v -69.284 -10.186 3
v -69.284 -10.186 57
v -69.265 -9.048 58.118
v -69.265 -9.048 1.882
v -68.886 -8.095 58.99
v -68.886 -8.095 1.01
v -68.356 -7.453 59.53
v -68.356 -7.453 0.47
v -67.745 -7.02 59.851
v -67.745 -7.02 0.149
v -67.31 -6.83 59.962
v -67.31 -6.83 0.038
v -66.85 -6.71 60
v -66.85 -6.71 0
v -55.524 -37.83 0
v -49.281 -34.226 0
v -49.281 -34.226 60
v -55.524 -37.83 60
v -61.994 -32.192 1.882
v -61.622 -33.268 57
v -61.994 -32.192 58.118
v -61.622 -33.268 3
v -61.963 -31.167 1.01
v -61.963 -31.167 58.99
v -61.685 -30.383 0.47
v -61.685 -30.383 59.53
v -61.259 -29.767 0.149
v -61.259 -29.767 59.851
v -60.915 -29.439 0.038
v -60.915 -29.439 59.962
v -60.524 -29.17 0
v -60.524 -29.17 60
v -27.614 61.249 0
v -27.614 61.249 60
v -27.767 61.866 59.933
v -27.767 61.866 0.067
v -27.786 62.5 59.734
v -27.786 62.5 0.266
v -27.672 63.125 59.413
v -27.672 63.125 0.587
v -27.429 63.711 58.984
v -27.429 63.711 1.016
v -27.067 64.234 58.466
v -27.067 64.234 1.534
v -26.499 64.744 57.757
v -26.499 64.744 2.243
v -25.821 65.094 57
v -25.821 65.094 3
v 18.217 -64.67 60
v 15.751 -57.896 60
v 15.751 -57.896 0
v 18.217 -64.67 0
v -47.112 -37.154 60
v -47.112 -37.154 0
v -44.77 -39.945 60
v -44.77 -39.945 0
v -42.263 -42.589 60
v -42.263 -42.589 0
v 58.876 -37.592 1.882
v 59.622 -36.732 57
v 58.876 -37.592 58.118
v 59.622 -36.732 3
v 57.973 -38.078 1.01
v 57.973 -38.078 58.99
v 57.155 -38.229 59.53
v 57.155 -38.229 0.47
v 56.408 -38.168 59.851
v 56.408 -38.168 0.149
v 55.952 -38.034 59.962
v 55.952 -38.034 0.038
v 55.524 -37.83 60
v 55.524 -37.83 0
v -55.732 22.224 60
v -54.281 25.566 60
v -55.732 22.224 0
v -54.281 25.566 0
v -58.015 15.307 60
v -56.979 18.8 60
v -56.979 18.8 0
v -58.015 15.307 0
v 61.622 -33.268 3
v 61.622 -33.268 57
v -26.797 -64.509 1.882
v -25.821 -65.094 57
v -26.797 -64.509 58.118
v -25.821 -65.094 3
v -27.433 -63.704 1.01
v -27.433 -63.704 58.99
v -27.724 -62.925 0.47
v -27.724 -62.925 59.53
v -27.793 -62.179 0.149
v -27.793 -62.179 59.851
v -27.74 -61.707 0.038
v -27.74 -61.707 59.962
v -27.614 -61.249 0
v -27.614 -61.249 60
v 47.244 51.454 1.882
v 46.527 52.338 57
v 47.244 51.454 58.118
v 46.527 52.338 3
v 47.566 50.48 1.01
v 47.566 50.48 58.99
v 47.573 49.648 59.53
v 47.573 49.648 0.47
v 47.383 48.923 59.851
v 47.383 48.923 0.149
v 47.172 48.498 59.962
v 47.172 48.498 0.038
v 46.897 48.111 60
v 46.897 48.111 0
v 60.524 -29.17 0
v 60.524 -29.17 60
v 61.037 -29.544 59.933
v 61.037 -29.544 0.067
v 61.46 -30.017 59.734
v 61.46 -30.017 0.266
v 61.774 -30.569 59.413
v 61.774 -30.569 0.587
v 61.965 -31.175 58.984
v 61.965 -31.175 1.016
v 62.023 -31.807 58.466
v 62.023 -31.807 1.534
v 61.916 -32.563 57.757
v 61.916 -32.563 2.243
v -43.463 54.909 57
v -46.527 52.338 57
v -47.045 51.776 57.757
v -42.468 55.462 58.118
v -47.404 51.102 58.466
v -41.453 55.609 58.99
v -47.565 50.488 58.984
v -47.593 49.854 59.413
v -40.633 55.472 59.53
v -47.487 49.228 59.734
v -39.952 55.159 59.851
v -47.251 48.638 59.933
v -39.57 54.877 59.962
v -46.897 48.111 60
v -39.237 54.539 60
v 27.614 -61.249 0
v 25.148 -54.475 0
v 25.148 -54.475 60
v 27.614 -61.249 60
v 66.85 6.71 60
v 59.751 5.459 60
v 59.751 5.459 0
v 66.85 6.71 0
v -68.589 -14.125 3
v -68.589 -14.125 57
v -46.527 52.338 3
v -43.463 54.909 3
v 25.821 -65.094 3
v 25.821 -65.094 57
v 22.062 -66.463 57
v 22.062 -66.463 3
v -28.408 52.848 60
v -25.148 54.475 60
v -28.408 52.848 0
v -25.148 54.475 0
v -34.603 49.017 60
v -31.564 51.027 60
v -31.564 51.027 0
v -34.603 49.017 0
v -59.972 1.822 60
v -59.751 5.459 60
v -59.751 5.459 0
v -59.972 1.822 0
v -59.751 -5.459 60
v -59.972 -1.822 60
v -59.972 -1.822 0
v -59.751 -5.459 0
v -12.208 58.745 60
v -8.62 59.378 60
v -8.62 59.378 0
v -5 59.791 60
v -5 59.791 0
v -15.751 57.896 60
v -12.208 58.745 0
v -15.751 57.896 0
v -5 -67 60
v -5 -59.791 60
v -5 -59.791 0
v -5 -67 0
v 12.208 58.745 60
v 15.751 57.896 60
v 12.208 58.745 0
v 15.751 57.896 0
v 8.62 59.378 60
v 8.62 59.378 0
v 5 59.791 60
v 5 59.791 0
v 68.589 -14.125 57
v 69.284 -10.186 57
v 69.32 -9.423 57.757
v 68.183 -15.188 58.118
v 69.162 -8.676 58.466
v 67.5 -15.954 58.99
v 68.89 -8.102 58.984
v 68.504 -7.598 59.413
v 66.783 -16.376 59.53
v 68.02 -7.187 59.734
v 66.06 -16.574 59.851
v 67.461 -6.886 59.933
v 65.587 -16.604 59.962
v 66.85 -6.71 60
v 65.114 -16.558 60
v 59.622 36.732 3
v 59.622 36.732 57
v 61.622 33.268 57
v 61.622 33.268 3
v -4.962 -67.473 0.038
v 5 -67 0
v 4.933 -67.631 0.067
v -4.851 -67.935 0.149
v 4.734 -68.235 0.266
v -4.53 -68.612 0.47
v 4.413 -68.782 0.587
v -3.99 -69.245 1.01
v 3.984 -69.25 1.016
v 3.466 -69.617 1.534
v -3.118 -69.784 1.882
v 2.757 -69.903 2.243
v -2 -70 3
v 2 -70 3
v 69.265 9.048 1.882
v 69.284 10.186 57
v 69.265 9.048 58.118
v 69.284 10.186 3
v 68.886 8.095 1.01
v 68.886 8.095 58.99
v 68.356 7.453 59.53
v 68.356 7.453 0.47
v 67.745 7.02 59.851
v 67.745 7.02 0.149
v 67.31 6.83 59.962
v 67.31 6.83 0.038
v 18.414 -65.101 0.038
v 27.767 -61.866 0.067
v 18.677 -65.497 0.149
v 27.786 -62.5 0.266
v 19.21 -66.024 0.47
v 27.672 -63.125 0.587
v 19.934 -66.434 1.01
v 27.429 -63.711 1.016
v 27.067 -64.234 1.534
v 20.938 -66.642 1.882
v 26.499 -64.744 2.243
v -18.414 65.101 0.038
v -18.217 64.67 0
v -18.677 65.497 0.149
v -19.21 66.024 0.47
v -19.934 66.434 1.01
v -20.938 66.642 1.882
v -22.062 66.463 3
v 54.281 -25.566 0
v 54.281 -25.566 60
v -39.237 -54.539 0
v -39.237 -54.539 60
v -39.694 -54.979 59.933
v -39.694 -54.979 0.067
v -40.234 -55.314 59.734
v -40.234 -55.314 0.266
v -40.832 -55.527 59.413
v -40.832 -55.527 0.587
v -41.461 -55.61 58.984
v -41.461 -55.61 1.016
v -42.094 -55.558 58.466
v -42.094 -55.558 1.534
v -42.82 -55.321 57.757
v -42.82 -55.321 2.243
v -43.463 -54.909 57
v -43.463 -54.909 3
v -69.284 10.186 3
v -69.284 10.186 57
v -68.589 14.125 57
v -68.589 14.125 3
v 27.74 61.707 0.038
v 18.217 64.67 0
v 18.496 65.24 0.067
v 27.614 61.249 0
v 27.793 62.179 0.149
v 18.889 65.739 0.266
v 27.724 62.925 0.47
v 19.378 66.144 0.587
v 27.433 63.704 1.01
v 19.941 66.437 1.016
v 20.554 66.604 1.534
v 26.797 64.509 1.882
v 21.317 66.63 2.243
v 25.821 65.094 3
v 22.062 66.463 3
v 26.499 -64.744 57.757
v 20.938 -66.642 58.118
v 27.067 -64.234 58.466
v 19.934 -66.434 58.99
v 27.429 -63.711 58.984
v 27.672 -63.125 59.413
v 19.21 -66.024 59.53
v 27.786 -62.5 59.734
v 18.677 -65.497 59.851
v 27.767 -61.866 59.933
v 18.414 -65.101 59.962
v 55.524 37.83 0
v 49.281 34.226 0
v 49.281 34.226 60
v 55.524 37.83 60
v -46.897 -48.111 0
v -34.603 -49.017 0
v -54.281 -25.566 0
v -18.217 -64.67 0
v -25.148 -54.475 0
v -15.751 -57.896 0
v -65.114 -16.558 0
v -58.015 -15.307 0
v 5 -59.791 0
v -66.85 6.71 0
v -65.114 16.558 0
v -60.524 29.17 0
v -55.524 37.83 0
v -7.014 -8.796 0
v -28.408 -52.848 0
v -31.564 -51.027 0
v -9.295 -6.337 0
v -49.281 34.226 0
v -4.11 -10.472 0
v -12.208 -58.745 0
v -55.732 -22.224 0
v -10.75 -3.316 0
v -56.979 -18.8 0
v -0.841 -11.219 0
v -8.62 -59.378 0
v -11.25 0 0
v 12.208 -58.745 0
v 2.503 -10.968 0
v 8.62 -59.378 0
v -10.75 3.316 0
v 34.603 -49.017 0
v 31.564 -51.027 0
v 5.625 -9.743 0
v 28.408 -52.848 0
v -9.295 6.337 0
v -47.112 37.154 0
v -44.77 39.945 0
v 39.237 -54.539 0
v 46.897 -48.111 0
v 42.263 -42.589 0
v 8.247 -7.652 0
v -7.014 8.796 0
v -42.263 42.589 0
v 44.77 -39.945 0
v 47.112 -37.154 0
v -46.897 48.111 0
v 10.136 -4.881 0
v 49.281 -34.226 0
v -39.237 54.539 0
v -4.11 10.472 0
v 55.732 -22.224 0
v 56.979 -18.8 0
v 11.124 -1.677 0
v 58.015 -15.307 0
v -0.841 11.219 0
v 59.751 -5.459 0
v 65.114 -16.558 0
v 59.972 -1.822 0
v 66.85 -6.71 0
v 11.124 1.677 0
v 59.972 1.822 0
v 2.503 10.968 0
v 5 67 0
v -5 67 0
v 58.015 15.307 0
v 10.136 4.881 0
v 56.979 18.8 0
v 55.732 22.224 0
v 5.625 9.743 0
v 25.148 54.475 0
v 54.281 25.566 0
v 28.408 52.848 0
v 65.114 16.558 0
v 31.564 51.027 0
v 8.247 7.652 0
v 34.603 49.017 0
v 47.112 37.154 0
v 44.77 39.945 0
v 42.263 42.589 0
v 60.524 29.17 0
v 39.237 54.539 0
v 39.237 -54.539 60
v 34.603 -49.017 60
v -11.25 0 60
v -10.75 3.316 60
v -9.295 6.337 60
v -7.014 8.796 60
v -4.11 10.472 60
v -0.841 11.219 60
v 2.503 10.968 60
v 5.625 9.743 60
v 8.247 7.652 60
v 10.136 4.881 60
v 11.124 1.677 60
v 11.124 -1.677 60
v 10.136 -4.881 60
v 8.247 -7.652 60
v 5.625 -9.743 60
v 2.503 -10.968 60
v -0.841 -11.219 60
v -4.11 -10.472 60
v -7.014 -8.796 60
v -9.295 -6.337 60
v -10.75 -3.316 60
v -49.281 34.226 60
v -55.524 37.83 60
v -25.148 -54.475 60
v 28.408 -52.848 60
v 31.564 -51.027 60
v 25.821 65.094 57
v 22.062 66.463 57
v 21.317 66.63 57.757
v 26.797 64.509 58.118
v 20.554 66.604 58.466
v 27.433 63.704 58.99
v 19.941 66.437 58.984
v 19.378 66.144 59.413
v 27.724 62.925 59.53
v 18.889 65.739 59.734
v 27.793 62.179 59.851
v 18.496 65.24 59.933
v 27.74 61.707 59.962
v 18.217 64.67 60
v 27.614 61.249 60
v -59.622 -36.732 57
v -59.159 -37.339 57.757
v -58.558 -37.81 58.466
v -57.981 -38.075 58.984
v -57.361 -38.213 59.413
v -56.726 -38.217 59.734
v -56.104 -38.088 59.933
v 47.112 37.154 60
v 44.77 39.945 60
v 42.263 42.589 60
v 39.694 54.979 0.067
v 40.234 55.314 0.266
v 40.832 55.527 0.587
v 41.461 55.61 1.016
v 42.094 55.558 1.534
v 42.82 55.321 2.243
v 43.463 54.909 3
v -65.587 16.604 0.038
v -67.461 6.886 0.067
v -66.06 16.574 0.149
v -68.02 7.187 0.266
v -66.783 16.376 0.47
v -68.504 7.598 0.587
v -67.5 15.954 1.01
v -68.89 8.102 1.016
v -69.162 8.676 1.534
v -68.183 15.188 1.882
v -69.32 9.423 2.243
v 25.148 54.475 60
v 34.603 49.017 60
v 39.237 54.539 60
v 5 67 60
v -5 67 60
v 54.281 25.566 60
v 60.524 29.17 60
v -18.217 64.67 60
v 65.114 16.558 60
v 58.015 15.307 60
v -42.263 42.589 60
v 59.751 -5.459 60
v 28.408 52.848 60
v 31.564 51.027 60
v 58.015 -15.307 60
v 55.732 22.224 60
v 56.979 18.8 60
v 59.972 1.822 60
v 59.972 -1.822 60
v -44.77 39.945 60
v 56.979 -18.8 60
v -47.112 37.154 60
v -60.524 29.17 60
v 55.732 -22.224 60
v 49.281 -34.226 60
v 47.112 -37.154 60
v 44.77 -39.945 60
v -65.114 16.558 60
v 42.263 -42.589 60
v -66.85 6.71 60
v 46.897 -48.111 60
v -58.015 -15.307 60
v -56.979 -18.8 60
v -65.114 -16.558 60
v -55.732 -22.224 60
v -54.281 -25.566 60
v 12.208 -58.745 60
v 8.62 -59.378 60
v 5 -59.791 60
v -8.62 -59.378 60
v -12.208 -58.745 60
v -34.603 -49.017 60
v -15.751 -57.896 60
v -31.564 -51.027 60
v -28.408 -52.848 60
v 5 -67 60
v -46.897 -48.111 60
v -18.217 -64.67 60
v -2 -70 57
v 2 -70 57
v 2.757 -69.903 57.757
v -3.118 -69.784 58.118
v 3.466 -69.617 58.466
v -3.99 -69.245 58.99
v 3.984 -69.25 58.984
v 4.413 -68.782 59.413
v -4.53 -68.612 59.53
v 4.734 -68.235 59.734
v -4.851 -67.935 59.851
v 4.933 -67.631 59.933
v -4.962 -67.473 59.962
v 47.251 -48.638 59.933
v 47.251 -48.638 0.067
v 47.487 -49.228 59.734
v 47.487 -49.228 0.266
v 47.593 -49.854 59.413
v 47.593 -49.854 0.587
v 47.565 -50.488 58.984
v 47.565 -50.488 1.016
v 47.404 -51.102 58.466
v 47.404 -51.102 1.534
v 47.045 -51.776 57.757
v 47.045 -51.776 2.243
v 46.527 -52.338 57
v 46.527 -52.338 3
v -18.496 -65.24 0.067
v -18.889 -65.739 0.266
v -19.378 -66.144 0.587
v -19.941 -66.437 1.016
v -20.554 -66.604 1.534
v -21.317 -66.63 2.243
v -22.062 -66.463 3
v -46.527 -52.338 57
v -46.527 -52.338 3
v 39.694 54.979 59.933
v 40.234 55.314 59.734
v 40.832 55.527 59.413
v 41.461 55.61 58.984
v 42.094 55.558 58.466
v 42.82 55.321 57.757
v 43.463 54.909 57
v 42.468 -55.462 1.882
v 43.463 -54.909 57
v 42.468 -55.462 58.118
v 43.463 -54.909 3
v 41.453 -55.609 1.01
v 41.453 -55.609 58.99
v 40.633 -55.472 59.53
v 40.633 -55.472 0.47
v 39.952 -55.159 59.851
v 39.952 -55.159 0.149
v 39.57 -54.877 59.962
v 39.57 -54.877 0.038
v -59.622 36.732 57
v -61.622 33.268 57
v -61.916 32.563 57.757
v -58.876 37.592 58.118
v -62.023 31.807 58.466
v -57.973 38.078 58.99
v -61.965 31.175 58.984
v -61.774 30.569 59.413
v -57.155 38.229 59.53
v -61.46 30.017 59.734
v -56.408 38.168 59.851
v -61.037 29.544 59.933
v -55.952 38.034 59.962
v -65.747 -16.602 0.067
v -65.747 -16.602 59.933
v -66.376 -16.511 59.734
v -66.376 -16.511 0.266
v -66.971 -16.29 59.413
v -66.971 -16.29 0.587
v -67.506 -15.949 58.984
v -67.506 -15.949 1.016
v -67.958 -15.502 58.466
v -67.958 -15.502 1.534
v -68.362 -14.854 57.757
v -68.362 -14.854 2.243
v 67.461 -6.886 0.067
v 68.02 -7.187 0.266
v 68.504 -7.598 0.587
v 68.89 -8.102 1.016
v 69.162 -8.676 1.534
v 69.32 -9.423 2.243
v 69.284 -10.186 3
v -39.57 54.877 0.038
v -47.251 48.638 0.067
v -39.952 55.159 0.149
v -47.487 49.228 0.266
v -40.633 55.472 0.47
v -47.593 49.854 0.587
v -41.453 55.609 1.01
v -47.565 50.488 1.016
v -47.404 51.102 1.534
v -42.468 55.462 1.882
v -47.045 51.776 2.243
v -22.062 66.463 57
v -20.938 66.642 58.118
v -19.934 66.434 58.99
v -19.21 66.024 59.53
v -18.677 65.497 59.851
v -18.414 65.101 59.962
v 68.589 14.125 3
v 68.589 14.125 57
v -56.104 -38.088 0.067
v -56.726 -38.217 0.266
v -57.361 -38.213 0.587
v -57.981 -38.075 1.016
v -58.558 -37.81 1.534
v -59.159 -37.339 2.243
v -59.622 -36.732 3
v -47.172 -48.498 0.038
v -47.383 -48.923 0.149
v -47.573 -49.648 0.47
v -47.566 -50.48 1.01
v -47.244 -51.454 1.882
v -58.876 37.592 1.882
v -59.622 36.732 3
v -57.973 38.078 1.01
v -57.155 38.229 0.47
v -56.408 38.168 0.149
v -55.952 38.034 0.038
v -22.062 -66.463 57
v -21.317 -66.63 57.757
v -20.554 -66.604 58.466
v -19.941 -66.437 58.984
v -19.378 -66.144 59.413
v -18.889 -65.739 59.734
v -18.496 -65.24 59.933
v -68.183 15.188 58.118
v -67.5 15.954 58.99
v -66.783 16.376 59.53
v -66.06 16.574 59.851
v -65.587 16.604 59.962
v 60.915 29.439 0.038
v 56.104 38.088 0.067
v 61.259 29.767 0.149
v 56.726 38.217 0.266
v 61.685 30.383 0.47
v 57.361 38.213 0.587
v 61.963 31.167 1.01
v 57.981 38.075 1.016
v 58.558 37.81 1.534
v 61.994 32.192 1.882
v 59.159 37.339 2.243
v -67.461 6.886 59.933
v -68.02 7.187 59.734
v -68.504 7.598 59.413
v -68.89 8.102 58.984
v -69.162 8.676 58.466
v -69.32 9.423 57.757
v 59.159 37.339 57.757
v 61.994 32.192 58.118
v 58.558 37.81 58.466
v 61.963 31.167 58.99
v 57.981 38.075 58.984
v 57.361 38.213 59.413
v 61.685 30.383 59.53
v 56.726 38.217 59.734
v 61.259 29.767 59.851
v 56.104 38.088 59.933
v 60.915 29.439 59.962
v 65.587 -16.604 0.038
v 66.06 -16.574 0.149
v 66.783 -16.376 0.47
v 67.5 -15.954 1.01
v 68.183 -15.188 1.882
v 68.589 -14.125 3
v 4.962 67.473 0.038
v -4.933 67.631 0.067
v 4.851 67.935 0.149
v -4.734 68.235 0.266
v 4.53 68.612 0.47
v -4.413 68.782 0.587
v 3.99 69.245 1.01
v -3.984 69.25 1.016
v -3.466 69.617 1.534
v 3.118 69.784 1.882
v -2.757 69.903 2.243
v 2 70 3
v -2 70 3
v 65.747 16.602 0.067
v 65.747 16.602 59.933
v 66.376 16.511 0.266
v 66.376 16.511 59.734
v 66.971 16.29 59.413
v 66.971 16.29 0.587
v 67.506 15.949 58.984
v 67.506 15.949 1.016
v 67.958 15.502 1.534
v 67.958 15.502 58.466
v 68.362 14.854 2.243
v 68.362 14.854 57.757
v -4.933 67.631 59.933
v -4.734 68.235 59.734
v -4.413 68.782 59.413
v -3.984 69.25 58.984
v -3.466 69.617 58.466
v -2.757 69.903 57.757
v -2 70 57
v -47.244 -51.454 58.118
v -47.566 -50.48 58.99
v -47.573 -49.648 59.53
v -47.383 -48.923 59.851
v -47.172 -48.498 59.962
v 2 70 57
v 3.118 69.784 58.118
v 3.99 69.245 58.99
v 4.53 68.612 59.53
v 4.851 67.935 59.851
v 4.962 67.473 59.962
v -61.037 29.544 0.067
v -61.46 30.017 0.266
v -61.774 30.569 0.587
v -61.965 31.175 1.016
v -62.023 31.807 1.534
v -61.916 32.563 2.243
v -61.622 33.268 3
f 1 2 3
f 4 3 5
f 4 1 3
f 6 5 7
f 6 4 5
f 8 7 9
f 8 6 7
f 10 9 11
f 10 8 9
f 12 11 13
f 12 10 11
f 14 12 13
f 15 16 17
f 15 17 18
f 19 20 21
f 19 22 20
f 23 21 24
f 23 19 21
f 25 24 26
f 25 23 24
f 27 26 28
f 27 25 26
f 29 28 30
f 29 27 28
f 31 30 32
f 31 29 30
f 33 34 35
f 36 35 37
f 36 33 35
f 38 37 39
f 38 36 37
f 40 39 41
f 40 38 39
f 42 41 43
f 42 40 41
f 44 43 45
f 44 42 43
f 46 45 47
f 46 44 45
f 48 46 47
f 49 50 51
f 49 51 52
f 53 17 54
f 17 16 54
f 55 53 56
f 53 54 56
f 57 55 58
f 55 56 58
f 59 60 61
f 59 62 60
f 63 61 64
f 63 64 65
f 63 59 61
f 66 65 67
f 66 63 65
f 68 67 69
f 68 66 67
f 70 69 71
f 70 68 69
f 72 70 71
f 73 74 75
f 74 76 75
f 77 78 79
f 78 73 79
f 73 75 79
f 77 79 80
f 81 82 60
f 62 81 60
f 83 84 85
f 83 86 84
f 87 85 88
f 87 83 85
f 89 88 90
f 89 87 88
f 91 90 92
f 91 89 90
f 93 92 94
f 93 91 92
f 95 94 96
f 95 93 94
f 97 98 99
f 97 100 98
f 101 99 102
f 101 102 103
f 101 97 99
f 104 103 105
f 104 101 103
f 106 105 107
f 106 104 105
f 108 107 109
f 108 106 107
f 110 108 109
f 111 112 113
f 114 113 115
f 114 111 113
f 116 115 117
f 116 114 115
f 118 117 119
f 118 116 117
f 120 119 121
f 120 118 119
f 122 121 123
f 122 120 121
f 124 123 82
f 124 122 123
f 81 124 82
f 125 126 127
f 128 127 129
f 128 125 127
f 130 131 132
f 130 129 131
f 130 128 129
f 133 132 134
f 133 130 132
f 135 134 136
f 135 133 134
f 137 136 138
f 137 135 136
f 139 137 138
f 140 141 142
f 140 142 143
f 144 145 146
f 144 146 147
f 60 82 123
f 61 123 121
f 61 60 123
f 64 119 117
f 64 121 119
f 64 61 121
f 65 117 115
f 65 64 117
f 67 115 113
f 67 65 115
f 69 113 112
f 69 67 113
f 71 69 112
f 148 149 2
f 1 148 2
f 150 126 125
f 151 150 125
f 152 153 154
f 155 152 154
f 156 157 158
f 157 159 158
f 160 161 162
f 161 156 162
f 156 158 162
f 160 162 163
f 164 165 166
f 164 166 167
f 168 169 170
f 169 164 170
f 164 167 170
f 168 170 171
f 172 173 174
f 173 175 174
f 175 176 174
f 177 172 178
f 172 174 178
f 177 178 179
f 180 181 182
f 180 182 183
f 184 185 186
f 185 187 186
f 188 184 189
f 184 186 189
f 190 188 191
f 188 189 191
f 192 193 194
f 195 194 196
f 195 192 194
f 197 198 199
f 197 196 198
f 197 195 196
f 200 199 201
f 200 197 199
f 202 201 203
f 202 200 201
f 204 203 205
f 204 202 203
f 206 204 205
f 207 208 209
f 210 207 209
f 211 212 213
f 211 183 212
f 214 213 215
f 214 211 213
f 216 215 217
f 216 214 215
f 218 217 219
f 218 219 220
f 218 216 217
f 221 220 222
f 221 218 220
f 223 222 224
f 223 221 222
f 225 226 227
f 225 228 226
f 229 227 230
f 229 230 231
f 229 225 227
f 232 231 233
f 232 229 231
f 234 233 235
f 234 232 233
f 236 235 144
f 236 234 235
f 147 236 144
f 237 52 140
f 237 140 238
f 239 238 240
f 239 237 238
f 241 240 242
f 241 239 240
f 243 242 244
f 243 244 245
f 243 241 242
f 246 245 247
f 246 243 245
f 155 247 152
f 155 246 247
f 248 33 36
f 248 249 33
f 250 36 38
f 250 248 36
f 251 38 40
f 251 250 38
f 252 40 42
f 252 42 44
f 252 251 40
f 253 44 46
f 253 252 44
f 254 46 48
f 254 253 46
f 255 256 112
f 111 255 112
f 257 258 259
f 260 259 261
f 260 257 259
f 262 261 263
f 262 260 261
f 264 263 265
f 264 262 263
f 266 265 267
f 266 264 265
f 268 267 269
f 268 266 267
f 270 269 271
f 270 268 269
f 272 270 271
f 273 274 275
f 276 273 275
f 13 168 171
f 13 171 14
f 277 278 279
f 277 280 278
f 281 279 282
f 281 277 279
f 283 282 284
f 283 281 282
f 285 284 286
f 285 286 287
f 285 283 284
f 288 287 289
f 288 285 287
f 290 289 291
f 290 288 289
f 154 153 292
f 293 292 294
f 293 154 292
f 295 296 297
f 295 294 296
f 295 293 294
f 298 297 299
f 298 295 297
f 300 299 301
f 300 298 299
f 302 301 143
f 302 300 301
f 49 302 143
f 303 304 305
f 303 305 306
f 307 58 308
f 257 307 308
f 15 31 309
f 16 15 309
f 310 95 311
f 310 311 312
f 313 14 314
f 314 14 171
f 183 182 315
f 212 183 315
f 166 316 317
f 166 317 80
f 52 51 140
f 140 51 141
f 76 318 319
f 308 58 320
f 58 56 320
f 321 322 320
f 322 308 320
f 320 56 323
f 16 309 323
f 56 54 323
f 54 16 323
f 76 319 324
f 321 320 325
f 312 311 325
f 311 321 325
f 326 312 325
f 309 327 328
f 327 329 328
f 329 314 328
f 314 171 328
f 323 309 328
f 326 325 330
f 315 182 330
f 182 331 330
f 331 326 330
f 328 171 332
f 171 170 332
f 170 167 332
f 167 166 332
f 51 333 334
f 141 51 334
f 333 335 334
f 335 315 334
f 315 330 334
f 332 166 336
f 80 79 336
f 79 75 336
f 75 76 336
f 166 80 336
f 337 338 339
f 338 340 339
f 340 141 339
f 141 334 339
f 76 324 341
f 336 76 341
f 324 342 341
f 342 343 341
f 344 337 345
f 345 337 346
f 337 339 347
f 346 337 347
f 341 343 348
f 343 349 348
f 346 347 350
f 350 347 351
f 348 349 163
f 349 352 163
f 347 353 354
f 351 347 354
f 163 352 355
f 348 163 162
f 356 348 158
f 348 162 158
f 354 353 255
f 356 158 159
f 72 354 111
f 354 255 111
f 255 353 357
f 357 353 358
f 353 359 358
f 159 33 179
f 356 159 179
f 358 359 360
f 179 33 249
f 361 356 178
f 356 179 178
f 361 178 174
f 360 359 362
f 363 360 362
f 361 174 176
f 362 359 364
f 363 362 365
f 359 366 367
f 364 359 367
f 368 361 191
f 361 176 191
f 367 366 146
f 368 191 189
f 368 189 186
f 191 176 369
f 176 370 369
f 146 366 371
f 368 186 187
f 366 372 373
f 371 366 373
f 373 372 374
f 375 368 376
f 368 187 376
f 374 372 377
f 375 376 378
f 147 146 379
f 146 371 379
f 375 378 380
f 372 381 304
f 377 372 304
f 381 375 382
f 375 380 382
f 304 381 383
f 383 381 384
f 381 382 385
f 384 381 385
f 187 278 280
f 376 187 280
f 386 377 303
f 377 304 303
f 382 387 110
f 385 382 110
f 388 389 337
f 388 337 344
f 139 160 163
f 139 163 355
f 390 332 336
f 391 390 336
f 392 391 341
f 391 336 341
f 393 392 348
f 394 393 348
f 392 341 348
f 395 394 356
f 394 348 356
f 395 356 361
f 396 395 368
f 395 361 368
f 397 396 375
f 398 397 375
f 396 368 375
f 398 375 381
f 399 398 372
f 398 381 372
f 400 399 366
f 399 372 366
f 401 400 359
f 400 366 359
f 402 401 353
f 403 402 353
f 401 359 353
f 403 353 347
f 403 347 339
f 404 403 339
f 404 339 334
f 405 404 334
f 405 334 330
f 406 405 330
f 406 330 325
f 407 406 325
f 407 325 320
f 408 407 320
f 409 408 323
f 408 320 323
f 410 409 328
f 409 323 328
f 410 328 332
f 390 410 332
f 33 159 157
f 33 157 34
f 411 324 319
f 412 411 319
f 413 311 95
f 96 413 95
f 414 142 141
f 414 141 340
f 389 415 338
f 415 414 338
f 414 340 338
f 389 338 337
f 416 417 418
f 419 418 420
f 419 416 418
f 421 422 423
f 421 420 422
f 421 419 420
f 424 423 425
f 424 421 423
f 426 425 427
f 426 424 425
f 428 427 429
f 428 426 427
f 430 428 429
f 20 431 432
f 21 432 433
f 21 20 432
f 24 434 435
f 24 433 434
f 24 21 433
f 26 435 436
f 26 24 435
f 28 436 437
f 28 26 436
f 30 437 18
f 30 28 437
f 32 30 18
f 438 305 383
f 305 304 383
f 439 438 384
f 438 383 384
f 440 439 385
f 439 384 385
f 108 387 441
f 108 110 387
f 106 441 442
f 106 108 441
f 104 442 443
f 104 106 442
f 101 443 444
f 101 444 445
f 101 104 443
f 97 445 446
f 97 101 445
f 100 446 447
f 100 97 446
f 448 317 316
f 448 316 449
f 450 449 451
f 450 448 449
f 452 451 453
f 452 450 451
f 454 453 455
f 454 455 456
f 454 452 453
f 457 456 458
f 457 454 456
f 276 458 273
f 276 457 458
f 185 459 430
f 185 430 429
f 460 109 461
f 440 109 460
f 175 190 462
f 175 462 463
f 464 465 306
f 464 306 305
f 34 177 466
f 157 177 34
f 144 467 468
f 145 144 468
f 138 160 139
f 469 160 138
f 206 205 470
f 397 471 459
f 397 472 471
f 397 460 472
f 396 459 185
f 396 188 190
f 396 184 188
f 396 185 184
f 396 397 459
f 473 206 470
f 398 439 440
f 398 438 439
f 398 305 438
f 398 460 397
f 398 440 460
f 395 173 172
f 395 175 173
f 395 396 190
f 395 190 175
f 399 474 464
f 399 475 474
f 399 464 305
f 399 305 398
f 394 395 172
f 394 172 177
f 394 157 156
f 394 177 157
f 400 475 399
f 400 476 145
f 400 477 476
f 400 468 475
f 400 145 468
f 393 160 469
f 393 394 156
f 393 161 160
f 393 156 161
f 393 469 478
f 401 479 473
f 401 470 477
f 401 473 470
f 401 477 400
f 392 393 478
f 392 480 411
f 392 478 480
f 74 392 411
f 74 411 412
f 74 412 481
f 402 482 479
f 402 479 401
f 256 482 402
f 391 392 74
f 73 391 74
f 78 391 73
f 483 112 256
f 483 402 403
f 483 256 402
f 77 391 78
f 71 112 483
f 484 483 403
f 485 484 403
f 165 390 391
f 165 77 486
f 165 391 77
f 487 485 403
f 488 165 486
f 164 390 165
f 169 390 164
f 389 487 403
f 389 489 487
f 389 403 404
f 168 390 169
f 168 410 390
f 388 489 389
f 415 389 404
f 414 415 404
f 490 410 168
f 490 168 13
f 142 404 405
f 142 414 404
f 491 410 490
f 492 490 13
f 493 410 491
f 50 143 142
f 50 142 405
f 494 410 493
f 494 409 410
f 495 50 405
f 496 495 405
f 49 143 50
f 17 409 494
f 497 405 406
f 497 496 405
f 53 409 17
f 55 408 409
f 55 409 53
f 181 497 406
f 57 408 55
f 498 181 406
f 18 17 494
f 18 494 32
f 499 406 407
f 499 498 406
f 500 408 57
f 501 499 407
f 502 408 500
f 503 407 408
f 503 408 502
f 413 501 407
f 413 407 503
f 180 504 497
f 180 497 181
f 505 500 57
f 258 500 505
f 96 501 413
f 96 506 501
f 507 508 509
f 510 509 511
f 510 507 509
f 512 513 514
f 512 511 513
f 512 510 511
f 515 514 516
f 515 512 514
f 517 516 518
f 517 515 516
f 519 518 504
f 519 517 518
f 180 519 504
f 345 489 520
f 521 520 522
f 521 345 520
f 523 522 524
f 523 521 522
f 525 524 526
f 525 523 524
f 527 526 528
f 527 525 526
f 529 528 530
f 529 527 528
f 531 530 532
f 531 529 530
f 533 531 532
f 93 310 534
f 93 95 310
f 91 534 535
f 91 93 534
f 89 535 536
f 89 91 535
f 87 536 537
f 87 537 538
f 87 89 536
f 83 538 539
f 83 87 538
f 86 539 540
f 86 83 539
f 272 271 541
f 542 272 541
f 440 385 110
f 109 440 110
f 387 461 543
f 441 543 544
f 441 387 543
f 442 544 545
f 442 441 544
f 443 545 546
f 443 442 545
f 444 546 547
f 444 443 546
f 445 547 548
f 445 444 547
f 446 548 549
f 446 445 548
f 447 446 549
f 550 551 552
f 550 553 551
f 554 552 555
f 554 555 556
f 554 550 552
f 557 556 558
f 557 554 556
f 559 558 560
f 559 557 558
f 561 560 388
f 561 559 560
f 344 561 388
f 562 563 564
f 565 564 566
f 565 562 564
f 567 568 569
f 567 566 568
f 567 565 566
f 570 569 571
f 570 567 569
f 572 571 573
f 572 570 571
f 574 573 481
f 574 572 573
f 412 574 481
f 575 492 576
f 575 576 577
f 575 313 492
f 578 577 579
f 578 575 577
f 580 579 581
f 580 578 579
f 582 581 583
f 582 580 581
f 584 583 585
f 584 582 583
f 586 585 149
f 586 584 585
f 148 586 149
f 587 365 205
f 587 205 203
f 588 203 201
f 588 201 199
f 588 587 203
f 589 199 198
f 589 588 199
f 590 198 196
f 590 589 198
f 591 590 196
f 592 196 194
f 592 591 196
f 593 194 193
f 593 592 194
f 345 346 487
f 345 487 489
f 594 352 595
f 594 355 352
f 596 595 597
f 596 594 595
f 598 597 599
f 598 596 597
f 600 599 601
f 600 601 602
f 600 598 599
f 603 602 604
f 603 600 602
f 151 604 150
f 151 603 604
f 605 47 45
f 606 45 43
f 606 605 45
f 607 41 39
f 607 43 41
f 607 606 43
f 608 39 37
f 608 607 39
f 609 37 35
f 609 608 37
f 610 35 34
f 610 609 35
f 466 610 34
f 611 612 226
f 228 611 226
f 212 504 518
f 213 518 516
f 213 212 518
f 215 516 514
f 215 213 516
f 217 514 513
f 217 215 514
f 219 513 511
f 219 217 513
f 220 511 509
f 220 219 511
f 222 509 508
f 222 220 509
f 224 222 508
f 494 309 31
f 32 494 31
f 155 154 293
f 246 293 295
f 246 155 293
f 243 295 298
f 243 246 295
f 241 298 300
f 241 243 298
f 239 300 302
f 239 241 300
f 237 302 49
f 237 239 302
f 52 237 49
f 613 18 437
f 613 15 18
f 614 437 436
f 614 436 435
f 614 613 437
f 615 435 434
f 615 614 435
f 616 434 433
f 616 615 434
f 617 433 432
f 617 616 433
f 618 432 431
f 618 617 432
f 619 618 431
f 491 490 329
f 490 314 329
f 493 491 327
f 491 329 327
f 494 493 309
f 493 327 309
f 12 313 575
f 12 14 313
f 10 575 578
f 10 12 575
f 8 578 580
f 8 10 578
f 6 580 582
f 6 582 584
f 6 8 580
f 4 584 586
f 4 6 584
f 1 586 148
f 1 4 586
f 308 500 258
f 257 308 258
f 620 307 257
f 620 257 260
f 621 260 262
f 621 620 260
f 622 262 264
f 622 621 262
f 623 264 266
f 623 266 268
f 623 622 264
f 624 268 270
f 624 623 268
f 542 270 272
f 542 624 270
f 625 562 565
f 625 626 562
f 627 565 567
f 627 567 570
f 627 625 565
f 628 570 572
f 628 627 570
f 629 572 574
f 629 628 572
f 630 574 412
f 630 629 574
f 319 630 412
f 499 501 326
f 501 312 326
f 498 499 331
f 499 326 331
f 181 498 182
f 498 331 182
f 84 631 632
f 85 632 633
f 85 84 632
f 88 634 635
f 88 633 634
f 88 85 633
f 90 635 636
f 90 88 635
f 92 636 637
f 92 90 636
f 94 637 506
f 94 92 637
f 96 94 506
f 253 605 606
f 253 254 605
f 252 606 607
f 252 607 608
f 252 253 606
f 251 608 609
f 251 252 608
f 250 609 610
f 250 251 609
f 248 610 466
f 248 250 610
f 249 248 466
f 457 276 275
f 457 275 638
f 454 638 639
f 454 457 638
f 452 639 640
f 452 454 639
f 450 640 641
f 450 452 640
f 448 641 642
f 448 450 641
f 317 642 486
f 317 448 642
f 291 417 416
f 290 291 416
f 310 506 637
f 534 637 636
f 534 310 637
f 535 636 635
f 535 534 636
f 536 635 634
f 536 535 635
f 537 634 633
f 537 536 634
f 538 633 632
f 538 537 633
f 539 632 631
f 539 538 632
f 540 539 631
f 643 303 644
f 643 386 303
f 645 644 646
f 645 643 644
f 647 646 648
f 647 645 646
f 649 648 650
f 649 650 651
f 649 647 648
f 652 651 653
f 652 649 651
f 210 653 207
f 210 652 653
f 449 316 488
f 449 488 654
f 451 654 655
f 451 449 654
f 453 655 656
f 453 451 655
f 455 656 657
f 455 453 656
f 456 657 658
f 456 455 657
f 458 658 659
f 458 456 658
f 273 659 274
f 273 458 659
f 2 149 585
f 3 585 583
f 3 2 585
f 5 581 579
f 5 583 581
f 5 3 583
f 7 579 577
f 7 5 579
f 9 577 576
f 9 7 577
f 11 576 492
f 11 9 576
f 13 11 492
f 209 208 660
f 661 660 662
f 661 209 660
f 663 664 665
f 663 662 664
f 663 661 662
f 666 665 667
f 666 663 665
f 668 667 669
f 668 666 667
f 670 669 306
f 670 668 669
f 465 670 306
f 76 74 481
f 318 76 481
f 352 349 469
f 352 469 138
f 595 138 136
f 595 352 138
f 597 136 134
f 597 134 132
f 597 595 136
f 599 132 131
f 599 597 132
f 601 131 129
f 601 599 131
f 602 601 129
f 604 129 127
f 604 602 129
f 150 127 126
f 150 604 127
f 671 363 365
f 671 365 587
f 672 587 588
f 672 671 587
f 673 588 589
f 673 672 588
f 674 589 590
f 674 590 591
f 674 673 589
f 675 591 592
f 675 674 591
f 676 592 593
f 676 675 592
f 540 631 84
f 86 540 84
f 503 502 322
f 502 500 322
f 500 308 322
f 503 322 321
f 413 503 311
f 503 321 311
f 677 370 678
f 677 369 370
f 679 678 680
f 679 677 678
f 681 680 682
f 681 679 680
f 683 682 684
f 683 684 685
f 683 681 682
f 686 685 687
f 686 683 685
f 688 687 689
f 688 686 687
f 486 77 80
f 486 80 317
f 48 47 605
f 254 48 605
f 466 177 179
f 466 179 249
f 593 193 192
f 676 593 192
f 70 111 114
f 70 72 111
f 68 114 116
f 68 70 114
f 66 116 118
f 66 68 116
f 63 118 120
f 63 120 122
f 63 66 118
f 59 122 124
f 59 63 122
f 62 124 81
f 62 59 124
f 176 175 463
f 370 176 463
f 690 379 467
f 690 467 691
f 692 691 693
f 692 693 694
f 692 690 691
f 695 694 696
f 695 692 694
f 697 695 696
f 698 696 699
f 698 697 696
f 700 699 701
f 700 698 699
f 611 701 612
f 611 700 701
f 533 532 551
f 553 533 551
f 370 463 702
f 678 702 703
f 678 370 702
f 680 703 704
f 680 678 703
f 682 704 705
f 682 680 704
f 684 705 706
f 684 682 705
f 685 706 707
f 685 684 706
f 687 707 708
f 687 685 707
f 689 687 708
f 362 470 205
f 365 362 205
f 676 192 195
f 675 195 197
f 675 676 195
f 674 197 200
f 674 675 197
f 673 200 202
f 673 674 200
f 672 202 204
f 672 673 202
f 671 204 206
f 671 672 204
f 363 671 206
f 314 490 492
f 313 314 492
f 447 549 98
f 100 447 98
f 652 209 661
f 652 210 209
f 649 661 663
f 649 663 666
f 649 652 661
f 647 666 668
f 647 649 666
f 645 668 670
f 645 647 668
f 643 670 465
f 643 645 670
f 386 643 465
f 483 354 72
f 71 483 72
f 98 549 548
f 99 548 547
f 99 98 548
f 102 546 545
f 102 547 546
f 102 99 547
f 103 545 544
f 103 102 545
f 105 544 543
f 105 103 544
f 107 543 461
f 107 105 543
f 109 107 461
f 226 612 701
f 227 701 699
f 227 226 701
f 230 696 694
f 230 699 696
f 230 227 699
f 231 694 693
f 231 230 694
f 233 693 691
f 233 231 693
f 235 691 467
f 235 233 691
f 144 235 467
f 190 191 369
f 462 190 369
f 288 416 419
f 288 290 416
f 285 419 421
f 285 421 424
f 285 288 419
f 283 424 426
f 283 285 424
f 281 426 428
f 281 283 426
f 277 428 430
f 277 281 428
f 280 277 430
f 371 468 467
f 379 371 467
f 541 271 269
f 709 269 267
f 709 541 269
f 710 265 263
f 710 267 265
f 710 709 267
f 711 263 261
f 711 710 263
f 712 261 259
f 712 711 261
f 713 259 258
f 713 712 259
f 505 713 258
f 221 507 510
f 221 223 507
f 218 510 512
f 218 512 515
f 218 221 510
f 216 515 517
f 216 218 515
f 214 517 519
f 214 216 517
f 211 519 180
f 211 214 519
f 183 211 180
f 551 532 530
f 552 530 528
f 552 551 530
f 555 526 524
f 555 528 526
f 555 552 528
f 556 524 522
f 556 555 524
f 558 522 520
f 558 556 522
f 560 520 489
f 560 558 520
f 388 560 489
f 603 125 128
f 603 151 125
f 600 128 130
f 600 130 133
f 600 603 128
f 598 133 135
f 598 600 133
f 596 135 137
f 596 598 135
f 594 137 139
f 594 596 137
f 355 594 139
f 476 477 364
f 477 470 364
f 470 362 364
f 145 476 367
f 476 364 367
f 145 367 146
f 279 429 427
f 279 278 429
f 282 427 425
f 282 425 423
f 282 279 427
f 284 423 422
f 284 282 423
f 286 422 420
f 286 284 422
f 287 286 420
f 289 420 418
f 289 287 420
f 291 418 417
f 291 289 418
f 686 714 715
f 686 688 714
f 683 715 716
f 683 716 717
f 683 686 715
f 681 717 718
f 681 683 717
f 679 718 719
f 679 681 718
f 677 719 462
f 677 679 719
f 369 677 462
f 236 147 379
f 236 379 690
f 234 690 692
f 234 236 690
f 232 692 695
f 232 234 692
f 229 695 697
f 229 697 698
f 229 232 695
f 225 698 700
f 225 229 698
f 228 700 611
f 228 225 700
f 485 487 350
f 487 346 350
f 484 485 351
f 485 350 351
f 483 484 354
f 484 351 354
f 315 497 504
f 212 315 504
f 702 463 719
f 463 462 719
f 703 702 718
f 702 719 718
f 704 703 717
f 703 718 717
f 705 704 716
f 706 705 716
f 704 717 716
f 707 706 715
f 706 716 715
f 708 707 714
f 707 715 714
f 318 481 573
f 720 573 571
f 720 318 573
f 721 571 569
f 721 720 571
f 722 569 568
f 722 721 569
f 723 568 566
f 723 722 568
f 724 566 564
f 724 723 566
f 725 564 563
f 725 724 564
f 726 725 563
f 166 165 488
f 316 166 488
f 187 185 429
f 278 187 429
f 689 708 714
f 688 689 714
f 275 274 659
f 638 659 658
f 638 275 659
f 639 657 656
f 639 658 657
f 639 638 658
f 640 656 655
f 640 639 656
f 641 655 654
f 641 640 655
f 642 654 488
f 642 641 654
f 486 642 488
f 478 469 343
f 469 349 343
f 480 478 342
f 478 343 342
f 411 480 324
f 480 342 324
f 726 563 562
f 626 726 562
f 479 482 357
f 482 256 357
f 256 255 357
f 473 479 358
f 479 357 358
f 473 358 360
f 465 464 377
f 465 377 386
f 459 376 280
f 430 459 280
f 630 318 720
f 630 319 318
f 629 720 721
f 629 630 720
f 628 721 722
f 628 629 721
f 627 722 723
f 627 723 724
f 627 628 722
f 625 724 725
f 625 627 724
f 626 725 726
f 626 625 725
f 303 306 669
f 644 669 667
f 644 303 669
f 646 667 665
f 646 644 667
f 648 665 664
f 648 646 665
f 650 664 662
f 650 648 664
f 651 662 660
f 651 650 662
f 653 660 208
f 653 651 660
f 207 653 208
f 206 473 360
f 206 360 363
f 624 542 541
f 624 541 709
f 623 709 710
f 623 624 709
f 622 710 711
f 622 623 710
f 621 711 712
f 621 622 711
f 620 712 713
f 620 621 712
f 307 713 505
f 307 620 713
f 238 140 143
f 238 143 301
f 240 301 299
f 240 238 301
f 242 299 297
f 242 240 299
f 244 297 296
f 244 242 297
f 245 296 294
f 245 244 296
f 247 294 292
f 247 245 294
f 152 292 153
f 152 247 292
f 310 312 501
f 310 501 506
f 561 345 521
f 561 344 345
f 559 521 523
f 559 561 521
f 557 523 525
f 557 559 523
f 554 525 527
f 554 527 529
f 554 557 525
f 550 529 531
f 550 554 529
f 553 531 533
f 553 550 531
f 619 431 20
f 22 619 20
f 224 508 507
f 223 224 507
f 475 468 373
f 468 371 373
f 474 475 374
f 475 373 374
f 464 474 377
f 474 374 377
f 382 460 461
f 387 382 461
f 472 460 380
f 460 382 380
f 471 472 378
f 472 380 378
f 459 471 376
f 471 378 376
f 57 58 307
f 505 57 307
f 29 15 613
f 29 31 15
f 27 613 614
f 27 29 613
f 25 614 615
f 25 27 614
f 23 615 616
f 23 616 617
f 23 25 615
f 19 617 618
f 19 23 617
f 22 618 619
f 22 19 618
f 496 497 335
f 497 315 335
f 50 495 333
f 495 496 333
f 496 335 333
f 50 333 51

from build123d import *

# Parameters (mm, degrees)
SKETCH2_R                = 60
BOSS_EXTRUDE1_DEPTH      = 60
SKETCH3_W                = 10
SKETCH3_H                = 10.47851478
BOSS_EXTRUDE2_DEPTH      = 60
FILLET2_R                = 3
CIRPATTERN1_COUNT        = 18
FILLET2_OF_CIRPATTERN1_R = 3
SKETCH4_R                = 10
CUT_EXTRUDE1_DEPTH       = 60
SKETCH5_R                = 11.25
CUT_EXTRUDE2_DEPTH       = 60


with BuildPart() as part:
    # Sketch2 → Boss-Extrude1 (new body)
    with BuildSketch(Plane.XY):
        Circle(SKETCH2_R)
    extrude(amount=BOSS_EXTRUDE1_DEPTH)

    # Sketch3 → Boss-Extrude2 (add)
    with BuildSketch(Plane.XY.offset(60)):
        with Locations((0, 64.76074261)):
            Rectangle(SKETCH3_W, SKETCH3_H)
    boss_extrude2 = extrude(amount=-BOSS_EXTRUDE2_DEPTH)

    # Fillet2
    fillet2_edges = [part.edges().sort_by_distance(p)[0] for p in [
        (5, 70, 30),
        (0, 70, 0),
        (-5, 70, 30),
        (0, 70, 60),
    ]]
    fillet(fillet2_edges, radius=FILLET2_R)

    # CirPattern1: Boss-Extrude2 ×18 about axis
    cirpattern1_axis = Axis((0, 0, 0), (0, 0, 1))
    for i in range(1, CIRPATTERN1_COUNT):
        add(boss_extrude2.rotate(cirpattern1_axis, i * 360 / CIRPATTERN1_COUNT))

    # Fillet2 of CirPattern1
    fillet2_of_cirpattern1_edges = [part.edges().sort_by_distance(p)[0] for p in [
        (-19.242946929, 67.488584172, 30),
        (-23.941410033, 65.778483455, 0),
        (-28.639873137, 64.068382738, 30),
        (-23.941410033, 65.778483455, 60),
        (-41.164910462, 56.837049067, 30),
        (-44.995132678, 53.623111018, 0),
        (-48.825354894, 50.40917297, 30),
        (-44.995132678, 53.623111018, 60),
        (-58.121778265, 39.330127019, 30),
        (-60.621778265, 35, 0),
        (-63.121778265, 30.669872981, 30),
        (-60.621778265, 35, 60),
        (-68.068301823, 17.079411202, 30),
        (-68.936542711, 12.155372437, 0),
        (-69.804783599, 7.231333672, 30),
        (-68.936542711, 12.155372437, 60),
        (-69.804783599, -7.231333672, 30),
        (-68.936542711, -12.155372437, 0),
        (-68.068301823, -17.079411202, 30),
        (-68.936542711, -12.155372437, 60),
        (-63.121778265, -30.669872981, 30),
        (-60.621778265, -35, 0),
        (-58.121778265, -39.330127019, 30),
        (-60.621778265, -35, 60),
        (-48.825354894, -50.40917297, 30),
        (-44.995132678, -53.623111018, 0),
        (-41.164910462, -56.837049067, 30),
        (-44.995132678, -53.623111018, 60),
        (-28.639873137, -64.068382738, 30),
        (-23.941410033, -65.778483455, 0),
        (-19.242946929, -67.488584172, 30),
        (-23.941410033, -65.778483455, 60),
        (-5, -70, 30),
        (0, -70, 0),
        (5, -70, 30),
        (0, -70, 60),
        (19.242946929, -67.488584172, 30),
        (23.941410033, -65.778483455, 0),
        (28.639873137, -64.068382738, 30),
        (23.941410033, -65.778483455, 60),
        (41.164910462, -56.837049067, 30),
        (44.995132678, -53.623111018, 0),
        (48.825354894, -50.40917297, 30),
        (44.995132678, -53.623111018, 60),
        (58.121778265, -39.330127019, 30),
        (60.621778265, -35, 0),
        (63.121778265, -30.669872981, 30),
        (60.621778265, -35, 60),
        (68.068301823, -17.079411202, 30),
        (68.936542711, -12.155372437, 0),
        (69.804783599, -7.231333672, 30),
        (68.936542711, -12.155372437, 60),
        (69.804783599, 7.231333672, 30),
        (68.936542711, 12.155372437, 0),
        (68.068301823, 17.079411202, 30),
        (68.936542711, 12.155372437, 60),
        (63.121778265, 30.669872981, 30),
        (60.621778265, 35, 0),
        (58.121778265, 39.330127019, 30),
        (60.621778265, 35, 60),
        (48.825354894, 50.40917297, 30),
        (44.995132678, 53.623111018, 0),
        (41.164910462, 56.837049067, 30),
        (44.995132678, 53.623111018, 60),
        (28.639873137, 64.068382738, 30),
        (23.941410033, 65.778483455, 0),
        (19.242946929, 67.488584172, 30),
        (23.941410033, 65.778483455, 60),
    ]]
    fillet(fillet2_of_cirpattern1_edges, radius=FILLET2_OF_CIRPATTERN1_R)

    # Sketch4 → Cut-Extrude1 (cut)
    with BuildSketch(Plane.XY.offset(60)):
        Circle(SKETCH4_R)
    extrude(amount=-CUT_EXTRUDE1_DEPTH, mode=Mode.SUBTRACT)

    # Sketch5 → Cut-Extrude2 (cut)
    with BuildSketch(Plane(origin=(0, 0, 0), x_dir=(-1, 0, 0), z_dir=(0, 0, -1))):
        Circle(SKETCH5_R)
    extrude(amount=-CUT_EXTRUDE2_DEPTH, mode=Mode.SUBTRACT)


solid = part.part
